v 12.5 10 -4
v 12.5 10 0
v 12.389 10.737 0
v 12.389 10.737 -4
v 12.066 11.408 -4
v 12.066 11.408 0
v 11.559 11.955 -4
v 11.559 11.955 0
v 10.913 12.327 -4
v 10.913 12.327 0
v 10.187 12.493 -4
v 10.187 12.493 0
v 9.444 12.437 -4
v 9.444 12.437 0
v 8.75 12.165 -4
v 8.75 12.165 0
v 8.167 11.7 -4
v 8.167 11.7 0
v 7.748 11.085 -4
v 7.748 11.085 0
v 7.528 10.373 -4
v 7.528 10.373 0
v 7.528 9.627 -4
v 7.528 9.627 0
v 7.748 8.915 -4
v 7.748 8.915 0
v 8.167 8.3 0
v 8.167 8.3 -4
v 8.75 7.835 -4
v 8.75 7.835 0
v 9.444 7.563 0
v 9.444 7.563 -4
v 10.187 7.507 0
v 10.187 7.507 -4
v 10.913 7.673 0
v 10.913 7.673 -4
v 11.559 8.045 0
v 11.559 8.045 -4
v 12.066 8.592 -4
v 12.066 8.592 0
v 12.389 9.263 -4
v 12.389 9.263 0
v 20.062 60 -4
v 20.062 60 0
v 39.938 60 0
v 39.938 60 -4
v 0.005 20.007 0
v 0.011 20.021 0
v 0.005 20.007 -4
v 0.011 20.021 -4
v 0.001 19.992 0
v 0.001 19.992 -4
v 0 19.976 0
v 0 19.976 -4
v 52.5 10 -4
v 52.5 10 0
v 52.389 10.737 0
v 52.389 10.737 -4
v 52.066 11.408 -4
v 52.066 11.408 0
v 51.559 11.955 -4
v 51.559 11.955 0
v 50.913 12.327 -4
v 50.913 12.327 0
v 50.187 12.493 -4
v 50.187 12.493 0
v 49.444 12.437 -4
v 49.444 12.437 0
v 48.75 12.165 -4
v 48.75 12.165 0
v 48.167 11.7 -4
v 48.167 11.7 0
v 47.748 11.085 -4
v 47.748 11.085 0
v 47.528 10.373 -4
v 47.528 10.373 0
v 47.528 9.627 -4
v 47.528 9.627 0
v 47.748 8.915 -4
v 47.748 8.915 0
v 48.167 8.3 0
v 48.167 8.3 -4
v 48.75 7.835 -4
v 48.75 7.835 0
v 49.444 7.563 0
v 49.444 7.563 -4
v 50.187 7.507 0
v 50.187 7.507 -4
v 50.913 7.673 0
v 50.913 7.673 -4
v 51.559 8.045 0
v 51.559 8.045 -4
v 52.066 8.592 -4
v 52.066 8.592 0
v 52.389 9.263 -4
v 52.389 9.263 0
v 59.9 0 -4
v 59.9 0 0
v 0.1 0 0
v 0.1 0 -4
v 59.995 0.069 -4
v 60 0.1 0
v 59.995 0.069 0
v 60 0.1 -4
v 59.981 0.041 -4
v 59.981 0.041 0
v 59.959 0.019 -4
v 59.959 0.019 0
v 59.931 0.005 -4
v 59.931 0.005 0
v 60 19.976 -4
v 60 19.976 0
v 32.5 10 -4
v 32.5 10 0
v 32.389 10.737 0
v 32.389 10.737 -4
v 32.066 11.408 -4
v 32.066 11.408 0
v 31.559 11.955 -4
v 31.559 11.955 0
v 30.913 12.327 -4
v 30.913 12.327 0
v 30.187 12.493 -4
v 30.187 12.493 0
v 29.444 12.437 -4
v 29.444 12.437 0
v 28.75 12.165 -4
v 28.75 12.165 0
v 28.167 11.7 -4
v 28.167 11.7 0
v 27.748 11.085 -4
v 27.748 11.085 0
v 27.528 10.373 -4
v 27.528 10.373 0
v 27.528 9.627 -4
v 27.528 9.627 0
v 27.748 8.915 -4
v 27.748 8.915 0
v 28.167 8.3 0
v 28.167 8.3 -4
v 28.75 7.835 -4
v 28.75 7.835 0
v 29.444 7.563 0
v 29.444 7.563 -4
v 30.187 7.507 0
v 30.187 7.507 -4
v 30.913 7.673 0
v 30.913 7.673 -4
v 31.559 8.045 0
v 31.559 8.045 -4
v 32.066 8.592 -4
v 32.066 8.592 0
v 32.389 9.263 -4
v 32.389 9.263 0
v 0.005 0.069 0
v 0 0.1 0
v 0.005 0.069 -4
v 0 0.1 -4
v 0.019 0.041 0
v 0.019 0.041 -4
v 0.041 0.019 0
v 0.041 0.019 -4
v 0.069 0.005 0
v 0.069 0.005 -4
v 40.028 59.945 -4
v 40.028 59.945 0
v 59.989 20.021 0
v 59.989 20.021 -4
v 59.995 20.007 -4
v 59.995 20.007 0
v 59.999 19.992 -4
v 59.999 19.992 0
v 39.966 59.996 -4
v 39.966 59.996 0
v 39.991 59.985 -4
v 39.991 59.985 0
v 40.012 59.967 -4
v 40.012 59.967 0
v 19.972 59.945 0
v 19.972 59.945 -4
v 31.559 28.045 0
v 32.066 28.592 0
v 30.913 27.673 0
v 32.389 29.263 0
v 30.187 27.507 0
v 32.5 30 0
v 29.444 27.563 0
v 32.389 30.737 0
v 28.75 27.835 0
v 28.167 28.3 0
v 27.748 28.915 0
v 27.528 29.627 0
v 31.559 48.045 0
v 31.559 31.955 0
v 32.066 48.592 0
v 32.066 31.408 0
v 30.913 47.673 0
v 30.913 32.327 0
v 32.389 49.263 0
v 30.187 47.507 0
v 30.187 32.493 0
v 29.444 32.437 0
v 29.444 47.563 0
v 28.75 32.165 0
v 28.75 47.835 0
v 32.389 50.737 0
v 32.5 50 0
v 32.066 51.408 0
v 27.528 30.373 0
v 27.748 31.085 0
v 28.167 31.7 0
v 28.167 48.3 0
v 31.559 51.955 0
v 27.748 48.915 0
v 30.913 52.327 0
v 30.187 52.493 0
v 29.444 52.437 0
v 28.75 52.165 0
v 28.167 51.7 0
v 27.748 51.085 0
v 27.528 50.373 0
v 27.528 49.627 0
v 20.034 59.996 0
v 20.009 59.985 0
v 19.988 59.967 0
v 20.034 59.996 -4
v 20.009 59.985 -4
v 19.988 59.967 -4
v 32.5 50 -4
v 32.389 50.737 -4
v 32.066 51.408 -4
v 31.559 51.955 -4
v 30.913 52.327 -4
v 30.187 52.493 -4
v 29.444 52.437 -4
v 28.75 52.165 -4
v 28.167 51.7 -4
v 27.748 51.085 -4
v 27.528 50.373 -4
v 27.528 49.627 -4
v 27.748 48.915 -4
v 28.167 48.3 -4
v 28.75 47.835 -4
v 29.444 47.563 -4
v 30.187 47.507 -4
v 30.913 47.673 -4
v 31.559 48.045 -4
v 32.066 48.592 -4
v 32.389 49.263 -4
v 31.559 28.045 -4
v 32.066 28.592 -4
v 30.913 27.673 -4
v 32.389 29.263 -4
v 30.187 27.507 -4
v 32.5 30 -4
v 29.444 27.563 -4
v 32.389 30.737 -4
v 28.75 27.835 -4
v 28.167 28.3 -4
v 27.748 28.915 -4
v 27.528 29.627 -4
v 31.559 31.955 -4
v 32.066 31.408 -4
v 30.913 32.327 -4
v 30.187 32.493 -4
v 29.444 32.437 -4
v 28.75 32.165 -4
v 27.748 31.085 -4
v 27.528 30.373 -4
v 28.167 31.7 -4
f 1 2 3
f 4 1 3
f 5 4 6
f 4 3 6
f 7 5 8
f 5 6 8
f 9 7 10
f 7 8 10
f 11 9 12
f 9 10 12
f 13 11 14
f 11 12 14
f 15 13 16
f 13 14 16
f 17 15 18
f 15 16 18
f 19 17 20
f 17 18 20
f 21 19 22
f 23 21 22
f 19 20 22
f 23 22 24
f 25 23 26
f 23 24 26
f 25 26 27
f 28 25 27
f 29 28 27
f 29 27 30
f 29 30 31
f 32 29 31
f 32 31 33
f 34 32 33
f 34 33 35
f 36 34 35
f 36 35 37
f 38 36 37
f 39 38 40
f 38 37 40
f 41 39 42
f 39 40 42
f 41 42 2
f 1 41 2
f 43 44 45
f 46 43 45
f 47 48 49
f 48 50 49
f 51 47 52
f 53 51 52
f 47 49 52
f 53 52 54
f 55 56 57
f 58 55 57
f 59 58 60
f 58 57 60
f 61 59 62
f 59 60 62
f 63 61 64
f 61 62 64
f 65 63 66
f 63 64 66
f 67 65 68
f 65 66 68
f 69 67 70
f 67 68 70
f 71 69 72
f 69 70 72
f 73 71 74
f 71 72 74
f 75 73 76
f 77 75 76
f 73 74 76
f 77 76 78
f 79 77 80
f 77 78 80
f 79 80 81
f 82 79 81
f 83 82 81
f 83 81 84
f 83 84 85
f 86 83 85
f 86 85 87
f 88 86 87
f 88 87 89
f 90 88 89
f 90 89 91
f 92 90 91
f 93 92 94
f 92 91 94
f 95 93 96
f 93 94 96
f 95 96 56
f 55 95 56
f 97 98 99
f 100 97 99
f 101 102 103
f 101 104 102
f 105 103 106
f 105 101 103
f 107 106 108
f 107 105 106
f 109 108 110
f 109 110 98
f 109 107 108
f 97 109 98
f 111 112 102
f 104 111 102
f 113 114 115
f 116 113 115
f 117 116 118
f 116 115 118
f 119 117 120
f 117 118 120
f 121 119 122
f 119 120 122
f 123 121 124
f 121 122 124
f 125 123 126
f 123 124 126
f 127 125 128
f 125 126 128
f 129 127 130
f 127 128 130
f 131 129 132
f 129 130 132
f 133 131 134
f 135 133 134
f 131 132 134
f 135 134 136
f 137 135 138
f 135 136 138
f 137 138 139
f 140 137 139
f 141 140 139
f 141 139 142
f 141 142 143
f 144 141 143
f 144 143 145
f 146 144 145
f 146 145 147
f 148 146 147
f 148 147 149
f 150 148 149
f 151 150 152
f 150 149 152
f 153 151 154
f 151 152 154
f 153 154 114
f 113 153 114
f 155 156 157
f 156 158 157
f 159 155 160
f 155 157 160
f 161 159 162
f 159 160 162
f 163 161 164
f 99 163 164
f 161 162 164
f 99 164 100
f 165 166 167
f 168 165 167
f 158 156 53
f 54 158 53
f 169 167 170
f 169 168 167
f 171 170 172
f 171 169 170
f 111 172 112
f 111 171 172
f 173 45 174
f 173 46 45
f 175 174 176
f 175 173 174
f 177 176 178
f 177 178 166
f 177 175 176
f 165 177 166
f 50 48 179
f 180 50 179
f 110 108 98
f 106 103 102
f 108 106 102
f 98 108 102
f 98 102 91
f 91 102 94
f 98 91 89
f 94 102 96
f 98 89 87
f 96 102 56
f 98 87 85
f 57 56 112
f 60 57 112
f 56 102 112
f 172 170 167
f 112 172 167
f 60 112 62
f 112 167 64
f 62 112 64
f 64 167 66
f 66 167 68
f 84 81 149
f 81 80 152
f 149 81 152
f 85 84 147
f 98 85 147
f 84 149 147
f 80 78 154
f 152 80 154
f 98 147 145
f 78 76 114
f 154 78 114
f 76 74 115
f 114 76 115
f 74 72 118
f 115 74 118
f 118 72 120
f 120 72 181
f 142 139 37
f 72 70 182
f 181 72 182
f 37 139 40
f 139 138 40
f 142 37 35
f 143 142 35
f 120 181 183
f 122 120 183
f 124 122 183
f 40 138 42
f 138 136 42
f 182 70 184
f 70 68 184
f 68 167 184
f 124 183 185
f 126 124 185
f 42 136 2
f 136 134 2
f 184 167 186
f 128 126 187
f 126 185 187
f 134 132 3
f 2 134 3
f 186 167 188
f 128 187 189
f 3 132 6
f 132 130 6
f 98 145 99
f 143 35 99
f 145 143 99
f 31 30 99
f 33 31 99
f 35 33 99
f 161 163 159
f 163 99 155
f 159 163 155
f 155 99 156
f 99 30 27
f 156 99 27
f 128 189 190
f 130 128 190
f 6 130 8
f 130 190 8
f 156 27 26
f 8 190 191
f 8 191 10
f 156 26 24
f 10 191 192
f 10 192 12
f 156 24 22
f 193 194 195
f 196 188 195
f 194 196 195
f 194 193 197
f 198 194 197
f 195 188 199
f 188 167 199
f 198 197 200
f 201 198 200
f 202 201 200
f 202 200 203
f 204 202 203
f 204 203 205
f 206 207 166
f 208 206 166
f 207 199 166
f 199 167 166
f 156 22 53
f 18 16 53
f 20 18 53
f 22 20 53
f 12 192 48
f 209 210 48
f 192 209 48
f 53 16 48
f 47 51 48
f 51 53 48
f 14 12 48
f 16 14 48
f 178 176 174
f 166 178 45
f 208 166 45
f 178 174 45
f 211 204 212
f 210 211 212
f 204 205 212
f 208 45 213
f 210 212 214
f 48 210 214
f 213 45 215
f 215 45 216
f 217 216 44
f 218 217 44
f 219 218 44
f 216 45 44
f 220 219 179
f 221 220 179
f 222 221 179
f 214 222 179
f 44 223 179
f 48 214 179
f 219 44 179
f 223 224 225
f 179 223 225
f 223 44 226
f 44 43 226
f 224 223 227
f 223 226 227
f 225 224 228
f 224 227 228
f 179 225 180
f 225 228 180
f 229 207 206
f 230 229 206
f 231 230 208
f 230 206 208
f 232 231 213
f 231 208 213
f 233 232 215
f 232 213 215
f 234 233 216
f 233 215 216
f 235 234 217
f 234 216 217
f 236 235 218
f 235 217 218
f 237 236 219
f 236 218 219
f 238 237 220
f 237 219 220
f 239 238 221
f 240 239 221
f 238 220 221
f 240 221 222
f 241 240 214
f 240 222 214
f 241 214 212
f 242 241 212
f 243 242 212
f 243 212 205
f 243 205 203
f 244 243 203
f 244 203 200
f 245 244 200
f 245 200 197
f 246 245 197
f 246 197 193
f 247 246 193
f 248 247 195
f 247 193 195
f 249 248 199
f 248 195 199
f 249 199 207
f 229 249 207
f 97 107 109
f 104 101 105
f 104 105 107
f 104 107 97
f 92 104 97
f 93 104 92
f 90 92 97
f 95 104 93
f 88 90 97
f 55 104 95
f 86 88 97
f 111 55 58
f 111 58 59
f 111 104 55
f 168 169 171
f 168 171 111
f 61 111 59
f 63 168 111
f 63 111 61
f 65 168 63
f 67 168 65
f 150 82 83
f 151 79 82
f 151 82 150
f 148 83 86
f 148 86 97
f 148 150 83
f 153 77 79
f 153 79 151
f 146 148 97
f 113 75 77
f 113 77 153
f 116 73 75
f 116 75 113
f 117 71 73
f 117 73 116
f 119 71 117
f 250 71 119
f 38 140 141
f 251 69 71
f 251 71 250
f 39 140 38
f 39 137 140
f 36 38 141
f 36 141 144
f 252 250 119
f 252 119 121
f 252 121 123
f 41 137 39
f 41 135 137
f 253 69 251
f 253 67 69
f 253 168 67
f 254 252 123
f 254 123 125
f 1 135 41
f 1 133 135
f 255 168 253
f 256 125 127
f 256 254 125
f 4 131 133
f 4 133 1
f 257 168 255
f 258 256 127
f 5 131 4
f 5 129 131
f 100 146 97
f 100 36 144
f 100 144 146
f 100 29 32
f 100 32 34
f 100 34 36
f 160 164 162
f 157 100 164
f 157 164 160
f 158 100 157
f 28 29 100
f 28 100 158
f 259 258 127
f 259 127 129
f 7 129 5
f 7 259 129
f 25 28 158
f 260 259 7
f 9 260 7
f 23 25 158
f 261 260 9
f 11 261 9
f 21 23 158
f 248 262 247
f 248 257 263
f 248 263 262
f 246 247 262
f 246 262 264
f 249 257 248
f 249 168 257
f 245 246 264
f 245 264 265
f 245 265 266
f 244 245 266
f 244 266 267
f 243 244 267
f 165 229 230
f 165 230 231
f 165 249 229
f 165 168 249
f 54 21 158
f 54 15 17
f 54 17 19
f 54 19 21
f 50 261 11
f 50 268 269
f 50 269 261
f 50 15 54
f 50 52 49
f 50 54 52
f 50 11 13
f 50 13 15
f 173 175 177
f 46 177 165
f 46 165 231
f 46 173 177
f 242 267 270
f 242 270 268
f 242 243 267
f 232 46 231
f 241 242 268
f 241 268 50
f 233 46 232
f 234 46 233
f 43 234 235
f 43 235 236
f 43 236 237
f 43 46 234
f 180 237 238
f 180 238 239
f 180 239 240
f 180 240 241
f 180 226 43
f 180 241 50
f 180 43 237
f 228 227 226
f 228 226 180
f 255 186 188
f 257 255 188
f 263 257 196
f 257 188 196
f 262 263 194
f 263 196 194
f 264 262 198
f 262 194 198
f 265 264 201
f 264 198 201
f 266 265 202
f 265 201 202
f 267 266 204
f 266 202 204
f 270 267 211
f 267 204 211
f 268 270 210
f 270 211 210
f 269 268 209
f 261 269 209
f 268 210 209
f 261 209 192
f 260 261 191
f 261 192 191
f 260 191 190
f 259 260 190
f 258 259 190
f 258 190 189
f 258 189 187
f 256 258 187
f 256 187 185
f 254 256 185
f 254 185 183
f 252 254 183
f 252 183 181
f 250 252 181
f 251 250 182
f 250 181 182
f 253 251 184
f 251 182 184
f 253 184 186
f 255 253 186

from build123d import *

# Parameters (mm, degrees)
BOSS_EXTRUDE1_DEPTH = 4
SKETCH2_R           = 2.5
CUT_EXTRUDE1_DEPTH  = 4
LPATTERN1_COUNT     = 3
LPATTERN1_PITCH     = 20
SKETCH3_R           = 2.5
CUT_EXTRUDE2_DEPTH  = 4
FILLET1_R           = 0.1


with BuildPart() as part:
    # Sketch1 → Boss-Extrude1 (new body)
    with BuildSketch(Plane.XY):
        Polygon((20, 60), (40, 60), (60, 20), (60, 0), (0, 0), (0, 20), align=None)
    extrude(amount=-BOSS_EXTRUDE1_DEPTH)

    # Sketch2 → Cut-Extrude1 (cut)
    with BuildSketch(Plane.XY):
        with Locations((30, 10)):
            Circle(SKETCH2_R)
    cut_extrude1 = extrude(amount=-CUT_EXTRUDE1_DEPTH, mode=Mode.SUBTRACT)

    # LPattern1: Cut-Extrude1 ×3
    with Locations(*[(0, i * LPATTERN1_PITCH, 0) for i in range(1, LPATTERN1_COUNT)]):
        add(cut_extrude1, mode=Mode.SUBTRACT)

    # Sketch3 → Cut-Extrude2 (cut)
    with BuildSketch(Plane.XY):
        with Locations((10, 10)):
            Circle(SKETCH3_R)
        with Locations((50, 10)):
            Circle(SKETCH3_R)
    extrude(amount=-CUT_EXTRUDE2_DEPTH, mode=Mode.SUBTRACT)

    # Fillet1
    fillet1_edges = [part.edges().sort_by_distance(p)[0] for p in [
        (0, 0, -2),
        (0, 20, -2),
        (20, 60, -2),
        (40, 60, -2),
        (60, 20, -2),
        (60, 0, -2),
    ]]
    fillet(fillet1_edges, radius=FILLET1_R)


solid = part.part
